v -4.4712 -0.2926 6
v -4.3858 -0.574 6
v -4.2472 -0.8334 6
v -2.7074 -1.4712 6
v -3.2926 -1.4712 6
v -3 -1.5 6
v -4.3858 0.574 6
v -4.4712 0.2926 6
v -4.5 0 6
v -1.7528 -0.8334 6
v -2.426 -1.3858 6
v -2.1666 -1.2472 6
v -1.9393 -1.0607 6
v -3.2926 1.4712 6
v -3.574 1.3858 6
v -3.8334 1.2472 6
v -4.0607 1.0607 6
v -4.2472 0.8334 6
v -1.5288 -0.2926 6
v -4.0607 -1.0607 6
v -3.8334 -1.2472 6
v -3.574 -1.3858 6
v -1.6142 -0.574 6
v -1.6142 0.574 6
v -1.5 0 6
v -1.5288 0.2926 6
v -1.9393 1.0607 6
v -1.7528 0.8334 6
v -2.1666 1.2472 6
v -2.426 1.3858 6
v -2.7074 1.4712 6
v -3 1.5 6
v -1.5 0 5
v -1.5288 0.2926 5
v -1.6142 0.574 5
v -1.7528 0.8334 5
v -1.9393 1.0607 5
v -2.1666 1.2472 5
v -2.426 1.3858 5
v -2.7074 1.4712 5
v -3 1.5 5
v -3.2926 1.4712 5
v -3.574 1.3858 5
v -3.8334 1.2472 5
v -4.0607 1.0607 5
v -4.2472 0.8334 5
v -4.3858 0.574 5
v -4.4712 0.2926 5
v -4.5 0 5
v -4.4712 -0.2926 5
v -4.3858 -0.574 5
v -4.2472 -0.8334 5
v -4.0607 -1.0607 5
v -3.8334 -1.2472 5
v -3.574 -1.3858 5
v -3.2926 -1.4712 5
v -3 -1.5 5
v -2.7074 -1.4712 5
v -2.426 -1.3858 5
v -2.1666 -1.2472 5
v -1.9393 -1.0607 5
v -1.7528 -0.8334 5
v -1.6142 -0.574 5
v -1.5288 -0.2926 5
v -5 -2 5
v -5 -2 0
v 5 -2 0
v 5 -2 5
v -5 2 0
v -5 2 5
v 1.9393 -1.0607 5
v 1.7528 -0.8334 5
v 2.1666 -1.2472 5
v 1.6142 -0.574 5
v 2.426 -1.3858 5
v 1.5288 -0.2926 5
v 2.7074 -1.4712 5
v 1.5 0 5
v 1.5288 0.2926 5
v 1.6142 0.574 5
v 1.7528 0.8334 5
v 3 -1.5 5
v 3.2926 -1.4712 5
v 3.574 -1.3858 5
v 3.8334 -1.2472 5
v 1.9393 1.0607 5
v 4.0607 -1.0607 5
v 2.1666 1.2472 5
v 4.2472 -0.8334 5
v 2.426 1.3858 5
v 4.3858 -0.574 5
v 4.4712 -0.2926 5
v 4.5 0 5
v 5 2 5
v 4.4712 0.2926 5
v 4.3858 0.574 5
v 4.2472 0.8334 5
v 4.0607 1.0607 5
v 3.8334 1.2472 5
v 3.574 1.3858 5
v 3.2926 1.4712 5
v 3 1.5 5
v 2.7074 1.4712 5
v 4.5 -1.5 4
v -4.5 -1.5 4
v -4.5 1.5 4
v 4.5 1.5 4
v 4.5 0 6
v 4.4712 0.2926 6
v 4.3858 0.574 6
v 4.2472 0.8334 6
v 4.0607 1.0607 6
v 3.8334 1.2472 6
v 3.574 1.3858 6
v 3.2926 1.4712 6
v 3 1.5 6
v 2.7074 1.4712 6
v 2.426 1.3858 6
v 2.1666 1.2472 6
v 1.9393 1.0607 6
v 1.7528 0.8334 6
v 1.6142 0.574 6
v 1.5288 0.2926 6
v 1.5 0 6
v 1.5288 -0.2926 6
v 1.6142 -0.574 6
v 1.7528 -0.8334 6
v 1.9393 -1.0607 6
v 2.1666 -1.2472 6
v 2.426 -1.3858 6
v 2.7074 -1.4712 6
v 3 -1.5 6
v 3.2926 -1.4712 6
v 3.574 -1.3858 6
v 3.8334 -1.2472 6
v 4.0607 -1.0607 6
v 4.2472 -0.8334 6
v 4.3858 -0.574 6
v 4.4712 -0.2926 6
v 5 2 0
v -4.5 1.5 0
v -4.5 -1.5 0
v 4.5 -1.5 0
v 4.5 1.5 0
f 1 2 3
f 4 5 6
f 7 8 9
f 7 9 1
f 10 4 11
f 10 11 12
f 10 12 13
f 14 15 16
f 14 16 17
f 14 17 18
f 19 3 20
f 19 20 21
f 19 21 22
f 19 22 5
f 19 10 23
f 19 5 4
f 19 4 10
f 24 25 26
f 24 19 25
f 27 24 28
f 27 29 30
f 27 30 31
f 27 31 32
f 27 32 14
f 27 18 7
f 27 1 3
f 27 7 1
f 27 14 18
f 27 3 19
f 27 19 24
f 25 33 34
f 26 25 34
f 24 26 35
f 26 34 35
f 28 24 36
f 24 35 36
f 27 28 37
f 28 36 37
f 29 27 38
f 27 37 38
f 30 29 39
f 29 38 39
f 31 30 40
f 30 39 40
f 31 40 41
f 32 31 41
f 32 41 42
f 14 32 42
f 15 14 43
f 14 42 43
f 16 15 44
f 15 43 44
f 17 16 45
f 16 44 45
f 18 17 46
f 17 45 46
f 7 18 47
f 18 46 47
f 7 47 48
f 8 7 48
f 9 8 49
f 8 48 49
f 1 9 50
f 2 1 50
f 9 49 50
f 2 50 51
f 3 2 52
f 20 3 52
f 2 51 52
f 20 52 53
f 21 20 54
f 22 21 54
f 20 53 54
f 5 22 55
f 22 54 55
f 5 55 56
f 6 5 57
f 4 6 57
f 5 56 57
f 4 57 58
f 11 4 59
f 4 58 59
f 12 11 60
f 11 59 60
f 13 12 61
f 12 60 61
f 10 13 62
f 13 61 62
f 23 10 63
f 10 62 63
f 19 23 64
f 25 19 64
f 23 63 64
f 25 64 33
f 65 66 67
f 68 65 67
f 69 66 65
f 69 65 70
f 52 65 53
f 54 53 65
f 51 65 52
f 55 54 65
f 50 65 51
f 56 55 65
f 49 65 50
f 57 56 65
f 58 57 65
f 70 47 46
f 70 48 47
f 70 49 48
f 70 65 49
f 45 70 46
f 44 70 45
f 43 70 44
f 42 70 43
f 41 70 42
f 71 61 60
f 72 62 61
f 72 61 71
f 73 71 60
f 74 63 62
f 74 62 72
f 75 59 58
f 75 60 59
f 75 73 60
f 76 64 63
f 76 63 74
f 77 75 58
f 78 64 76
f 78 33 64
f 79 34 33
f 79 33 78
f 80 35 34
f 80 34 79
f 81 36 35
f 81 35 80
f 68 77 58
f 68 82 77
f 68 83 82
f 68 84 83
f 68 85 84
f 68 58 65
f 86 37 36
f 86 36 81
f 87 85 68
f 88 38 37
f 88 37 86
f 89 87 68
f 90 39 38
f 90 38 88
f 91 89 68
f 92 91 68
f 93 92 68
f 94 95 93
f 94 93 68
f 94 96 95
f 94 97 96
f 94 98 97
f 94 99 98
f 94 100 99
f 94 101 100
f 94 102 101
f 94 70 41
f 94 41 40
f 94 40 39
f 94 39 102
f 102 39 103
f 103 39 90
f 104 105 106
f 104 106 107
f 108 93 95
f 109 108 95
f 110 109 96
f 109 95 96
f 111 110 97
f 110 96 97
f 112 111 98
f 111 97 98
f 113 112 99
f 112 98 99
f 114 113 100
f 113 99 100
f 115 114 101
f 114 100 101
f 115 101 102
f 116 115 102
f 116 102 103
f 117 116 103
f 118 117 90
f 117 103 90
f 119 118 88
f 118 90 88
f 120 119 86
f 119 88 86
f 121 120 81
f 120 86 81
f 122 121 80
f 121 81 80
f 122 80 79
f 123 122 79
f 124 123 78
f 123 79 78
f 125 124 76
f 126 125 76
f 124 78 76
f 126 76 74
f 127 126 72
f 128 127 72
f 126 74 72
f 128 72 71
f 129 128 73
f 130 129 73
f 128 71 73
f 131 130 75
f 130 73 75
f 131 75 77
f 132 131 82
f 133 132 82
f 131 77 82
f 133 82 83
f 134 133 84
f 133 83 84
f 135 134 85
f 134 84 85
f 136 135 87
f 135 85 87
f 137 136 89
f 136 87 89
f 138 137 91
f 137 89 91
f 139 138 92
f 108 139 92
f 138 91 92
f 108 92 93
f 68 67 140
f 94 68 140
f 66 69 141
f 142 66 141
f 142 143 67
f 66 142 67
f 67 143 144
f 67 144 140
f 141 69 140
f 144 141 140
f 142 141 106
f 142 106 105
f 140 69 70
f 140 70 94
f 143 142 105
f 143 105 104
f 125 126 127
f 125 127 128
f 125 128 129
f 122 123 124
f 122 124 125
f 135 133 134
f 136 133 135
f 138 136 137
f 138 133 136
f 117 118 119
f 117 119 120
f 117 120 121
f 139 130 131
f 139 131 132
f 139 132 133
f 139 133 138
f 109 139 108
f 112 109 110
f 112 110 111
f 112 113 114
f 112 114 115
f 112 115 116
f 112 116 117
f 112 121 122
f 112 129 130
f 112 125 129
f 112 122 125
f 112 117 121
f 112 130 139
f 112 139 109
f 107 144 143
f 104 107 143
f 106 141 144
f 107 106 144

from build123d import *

# Parameters (mm, degrees)
F0_W     = 10
F0_H     = 4
F1_DEPTH = 5
F2_W     = 9
F2_H     = 3
F3_DEPTH = 4
F4_R     = 1.5
F5_DEPTH = 1


with BuildPart() as f1:
    # F0 (on Top) → F1 (new body)
    with BuildSketch(Plane.XY):
        Rectangle(F0_W, F0_H)
    extrude(amount=F1_DEPTH)

    # F2 (on face) → F3 (cut)
    with BuildSketch(Plane(origin=(0, 0, 0), x_dir=(1, 0, 0), z_dir=(0, 0, -1))):
        Rectangle(F2_W, F2_H)
    extrude(amount=-F3_DEPTH, mode=Mode.SUBTRACT)

    # F4 (on face) → F5 (join)
    with BuildSketch(Plane.XY.offset(5)):
        with Locations((-3, 0)):
            Circle(F4_R)
        with Locations((3, 0)):
            Circle(F4_R)
    extrude(amount=F5_DEPTH)


solid = f1.part
